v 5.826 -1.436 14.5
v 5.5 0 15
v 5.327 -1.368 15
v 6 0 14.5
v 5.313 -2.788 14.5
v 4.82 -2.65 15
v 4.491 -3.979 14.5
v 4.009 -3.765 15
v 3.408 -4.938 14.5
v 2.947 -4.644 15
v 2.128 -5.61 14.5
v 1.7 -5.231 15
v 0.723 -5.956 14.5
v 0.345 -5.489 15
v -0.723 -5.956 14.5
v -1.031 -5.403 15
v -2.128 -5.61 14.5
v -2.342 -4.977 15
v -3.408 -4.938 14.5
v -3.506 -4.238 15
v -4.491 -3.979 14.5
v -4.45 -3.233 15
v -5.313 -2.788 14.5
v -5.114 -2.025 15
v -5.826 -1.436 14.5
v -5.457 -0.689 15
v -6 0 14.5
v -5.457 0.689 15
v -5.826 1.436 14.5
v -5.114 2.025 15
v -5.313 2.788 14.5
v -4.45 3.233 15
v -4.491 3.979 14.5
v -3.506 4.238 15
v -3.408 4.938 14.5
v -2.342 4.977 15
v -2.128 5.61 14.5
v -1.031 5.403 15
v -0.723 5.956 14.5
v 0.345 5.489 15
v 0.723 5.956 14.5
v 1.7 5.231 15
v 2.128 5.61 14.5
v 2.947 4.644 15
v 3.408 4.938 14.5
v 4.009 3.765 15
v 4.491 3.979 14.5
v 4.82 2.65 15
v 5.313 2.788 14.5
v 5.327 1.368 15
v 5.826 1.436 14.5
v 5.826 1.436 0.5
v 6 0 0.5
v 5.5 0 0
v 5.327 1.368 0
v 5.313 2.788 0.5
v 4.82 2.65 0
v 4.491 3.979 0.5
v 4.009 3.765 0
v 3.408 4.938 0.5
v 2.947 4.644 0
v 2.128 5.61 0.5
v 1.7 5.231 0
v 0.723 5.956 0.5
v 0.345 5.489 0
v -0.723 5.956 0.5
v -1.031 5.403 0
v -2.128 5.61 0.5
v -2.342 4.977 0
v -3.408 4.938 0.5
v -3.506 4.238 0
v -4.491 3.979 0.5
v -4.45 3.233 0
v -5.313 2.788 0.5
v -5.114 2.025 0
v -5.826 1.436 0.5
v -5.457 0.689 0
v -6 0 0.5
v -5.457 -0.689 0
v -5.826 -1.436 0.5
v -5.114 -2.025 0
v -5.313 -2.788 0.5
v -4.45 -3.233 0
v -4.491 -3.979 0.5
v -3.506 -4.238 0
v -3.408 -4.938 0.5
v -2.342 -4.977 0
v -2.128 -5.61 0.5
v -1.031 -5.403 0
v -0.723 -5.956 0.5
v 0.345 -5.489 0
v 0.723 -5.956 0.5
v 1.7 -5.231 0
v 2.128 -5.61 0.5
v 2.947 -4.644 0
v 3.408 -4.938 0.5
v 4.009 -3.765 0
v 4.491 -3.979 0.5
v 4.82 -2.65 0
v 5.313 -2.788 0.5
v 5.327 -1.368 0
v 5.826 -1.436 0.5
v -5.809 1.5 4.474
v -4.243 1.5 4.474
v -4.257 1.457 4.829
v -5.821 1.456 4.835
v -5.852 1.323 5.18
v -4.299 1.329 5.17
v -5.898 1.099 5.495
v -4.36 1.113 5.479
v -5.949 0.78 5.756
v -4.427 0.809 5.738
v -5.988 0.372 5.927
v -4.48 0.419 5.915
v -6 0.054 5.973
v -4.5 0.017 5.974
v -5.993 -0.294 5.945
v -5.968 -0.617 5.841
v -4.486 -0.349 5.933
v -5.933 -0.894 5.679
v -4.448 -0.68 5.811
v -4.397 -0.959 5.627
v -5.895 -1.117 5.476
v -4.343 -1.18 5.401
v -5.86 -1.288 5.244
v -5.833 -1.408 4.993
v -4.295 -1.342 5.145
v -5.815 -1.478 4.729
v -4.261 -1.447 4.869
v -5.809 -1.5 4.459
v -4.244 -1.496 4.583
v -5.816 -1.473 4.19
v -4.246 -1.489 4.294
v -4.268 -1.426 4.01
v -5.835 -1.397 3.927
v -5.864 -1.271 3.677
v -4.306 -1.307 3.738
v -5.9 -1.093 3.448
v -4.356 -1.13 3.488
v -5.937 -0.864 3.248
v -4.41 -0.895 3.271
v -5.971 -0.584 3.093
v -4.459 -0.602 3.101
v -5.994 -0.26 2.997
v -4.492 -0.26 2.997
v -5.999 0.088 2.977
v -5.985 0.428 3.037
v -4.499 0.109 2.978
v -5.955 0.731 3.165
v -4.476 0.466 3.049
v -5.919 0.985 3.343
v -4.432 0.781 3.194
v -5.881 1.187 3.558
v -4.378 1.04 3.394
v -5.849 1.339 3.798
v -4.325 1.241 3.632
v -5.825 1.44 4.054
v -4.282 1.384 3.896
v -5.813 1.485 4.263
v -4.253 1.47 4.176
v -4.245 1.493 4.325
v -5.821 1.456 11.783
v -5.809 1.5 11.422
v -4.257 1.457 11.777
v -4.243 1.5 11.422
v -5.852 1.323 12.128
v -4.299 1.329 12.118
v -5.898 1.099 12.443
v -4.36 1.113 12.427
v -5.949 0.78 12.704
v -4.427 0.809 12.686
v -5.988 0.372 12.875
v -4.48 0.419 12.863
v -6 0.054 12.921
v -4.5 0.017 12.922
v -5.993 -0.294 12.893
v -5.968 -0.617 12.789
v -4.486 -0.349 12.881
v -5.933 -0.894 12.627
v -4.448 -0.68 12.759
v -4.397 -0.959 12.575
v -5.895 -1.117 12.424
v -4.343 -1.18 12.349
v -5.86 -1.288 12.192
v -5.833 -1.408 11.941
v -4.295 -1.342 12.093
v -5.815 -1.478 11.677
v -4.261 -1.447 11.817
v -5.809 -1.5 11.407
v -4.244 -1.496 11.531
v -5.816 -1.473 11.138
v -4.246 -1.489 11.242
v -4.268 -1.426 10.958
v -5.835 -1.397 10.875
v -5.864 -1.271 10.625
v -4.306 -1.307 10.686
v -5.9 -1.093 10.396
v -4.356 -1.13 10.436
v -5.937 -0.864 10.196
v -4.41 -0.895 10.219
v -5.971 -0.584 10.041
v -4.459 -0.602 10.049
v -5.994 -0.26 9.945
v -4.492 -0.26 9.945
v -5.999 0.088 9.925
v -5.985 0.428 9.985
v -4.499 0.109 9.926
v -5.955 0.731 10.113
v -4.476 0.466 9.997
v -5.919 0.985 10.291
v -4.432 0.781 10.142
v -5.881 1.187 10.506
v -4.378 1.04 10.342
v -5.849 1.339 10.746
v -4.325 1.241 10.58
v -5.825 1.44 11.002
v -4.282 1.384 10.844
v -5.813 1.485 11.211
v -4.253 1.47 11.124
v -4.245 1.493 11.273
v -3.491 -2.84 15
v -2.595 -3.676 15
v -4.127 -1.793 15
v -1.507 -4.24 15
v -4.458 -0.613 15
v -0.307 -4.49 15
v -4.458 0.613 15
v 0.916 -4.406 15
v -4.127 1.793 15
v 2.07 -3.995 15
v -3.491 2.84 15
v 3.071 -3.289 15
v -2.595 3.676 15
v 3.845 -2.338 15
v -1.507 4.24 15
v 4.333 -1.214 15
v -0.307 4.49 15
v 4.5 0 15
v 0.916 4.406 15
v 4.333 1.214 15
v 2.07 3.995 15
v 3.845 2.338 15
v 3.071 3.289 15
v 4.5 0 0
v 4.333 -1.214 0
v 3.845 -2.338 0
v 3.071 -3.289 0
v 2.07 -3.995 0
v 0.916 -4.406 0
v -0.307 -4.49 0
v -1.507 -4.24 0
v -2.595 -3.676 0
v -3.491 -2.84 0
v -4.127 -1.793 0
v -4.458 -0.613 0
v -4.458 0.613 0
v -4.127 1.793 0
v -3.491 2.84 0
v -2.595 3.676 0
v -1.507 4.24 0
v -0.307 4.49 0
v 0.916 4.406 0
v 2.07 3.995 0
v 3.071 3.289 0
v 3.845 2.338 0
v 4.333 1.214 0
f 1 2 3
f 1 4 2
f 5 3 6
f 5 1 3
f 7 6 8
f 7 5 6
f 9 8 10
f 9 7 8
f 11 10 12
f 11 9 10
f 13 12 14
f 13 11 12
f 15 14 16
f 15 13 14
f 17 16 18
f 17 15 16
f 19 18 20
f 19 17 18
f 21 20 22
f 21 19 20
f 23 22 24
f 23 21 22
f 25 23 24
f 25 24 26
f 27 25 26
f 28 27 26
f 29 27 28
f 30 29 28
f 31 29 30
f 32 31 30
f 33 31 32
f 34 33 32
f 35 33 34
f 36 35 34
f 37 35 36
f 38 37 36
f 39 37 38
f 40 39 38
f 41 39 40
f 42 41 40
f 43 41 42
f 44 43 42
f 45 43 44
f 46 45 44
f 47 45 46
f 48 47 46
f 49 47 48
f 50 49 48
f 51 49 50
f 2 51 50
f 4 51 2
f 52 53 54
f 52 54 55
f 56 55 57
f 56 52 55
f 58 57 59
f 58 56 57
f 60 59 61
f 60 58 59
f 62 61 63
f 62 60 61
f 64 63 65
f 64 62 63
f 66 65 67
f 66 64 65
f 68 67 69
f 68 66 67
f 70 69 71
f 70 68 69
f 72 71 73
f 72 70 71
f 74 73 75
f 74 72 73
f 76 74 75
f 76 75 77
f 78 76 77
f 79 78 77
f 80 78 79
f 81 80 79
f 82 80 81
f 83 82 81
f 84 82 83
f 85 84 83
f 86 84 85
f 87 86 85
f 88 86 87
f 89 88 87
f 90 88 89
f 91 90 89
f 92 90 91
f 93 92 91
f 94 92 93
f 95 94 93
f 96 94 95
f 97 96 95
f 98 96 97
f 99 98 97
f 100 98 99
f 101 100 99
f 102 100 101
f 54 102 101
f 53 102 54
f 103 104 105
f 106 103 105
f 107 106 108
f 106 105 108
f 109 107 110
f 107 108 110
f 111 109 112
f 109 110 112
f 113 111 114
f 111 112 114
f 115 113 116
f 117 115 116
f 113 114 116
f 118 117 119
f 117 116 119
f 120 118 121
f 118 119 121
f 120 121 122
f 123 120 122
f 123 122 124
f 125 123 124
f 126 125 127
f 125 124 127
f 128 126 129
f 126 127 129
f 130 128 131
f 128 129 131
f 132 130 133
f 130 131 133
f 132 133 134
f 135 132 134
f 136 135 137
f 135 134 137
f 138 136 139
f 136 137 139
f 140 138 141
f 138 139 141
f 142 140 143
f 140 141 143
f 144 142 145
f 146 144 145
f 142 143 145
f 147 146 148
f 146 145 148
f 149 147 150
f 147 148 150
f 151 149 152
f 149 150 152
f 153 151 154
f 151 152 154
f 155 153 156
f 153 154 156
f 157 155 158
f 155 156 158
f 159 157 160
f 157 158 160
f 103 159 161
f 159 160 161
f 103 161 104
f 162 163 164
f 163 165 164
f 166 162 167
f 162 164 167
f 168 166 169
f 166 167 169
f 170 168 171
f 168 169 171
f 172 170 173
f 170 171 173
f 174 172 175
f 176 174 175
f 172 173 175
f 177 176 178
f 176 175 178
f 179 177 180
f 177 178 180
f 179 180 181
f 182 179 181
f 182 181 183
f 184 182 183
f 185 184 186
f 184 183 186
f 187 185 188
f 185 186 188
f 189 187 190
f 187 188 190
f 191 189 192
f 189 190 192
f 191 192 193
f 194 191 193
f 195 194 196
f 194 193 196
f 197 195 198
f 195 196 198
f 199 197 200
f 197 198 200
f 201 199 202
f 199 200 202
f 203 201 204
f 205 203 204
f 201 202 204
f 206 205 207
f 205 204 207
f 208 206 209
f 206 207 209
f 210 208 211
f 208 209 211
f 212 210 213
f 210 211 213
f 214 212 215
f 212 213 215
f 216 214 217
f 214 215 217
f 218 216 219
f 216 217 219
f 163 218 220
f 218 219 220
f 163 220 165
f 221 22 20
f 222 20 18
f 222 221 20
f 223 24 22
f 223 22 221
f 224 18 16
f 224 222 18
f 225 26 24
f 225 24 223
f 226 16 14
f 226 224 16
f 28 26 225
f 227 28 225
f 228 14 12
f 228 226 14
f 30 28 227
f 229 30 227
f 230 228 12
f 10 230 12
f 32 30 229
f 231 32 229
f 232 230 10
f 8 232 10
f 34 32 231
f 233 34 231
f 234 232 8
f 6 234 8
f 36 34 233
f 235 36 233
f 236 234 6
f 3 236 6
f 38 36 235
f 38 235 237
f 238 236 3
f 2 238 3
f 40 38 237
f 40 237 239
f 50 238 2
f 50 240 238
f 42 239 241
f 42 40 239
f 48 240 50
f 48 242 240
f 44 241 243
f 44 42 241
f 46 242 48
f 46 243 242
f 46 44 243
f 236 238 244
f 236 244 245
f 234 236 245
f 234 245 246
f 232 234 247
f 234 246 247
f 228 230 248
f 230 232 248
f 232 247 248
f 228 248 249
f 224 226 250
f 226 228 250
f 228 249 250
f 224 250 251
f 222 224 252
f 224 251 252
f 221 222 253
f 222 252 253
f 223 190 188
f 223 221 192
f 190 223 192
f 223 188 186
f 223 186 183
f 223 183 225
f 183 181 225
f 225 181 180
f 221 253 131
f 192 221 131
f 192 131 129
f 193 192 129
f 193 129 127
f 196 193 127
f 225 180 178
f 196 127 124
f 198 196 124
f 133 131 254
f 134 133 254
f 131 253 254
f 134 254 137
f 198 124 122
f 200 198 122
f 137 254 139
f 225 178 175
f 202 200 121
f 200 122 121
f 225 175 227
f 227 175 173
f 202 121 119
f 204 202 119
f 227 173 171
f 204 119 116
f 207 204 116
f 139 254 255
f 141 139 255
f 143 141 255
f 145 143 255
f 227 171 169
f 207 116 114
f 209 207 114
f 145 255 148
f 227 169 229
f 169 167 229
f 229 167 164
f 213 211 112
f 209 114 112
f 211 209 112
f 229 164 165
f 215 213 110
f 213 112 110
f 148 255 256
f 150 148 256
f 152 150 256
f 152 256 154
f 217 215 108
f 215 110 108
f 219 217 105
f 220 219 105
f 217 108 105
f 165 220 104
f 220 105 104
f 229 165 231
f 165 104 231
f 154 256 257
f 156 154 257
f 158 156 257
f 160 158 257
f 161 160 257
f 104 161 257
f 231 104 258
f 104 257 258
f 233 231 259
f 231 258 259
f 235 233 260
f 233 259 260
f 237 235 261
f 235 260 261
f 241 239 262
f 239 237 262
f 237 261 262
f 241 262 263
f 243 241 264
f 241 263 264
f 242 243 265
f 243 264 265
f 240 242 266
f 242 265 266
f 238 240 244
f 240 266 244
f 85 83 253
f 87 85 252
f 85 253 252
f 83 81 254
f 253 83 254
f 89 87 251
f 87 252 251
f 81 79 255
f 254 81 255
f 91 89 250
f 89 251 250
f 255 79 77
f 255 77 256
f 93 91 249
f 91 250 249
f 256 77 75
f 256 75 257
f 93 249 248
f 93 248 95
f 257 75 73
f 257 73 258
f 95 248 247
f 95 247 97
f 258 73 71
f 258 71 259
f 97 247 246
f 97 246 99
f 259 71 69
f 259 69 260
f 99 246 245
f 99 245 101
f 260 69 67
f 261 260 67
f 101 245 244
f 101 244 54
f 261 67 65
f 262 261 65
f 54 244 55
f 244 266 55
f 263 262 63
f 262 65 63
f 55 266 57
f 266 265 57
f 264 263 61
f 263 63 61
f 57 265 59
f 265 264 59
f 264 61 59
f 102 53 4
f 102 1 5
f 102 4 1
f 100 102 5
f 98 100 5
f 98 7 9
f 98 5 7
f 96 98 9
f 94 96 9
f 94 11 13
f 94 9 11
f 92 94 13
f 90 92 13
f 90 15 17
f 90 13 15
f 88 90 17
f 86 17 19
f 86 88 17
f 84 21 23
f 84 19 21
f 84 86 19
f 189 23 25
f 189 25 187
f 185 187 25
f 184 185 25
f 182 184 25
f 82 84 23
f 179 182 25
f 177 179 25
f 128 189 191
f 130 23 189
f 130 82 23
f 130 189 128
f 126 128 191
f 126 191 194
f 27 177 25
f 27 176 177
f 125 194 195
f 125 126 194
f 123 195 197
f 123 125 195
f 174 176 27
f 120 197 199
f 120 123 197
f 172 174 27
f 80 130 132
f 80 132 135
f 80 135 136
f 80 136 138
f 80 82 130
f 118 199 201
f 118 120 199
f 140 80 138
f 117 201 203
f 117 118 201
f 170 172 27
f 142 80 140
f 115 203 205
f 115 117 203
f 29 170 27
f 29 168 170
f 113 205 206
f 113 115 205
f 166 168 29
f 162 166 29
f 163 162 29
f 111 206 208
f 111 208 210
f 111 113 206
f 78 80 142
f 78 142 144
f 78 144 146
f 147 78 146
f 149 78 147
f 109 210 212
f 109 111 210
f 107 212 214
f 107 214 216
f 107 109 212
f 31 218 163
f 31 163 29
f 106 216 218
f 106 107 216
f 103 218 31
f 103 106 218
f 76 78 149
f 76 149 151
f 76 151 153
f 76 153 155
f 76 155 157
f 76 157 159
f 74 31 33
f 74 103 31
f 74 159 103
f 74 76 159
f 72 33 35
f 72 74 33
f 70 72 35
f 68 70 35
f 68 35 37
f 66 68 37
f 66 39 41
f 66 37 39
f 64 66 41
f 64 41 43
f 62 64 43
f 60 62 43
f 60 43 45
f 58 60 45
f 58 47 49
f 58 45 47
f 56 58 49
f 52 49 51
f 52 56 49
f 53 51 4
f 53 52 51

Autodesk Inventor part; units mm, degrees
ref_plane "YZ Plane" through (0, 0, 0) normal (1, 0, 0) x (0, 1, 0)
ref_plane "XZ Plane" through (0, 0, 0) normal (0, 1, 0) x (-1, 0, 0)
ref_plane "XY Plane" through (0, 0, 0) normal (0, 0, 1) x (1, 0, 0)
sketch "Sketch1" plane through (0, 0, 0) normal (0, 0, 1) x (1, 0, 0)
  circle A0 centre (0, 0) radius 4.5
  circle A1 centre (0, 0) radius 6
  dimension "d0" = 9
  dimension "d1" = 12
extrude "Extrusion1" add sketch "Sketch1" along normal blind 15
chamfer "Chamfer1" distance 0.5 angle 45 2 edges at (-6, 0, 15) (-6, 0, 0)
sketch "Sketch2" plane through (0, 0, 0) normal (1, 0, 0) x (0, 1, 0)
  circle A0 centre (0, 11.4223) radius 1.5
  circle A1 centre (0, 4.4743) radius 1.5
  point P0 (0, 0)
  dimension "d7" = 3
  dimension "d8" = 3
extrude "Extrusion2" cut sketch "Sketch2" against normal blind 10
thread "Thread1" size "M3x0.5" class "6H" standard "ANSI Metric M Profile" full length
thread "Thread2" size "M3x0.5" class "6H" standard "ANSI Metric M Profile" full length
equation "\"BendRadius\" = Thickness"
equation "\"BendReliefWidth\" = Thickness"
equation "\"BendReliefDepth\" = 0.5 * Thickness"
equation "\"CornerReliefSize\" = 4 * Thickness"
equation "\"MinimumRemnant\" = 2 * Thickness"
equation "\"TransitionRadius\" = BendRadius"
equation "\"JacobiRadiusSize\" = BendRadius"
equation "\"GapSize\" = Thickness"
equation "\"Thickness\" = 0.5"
properties part number "khớp nối"
